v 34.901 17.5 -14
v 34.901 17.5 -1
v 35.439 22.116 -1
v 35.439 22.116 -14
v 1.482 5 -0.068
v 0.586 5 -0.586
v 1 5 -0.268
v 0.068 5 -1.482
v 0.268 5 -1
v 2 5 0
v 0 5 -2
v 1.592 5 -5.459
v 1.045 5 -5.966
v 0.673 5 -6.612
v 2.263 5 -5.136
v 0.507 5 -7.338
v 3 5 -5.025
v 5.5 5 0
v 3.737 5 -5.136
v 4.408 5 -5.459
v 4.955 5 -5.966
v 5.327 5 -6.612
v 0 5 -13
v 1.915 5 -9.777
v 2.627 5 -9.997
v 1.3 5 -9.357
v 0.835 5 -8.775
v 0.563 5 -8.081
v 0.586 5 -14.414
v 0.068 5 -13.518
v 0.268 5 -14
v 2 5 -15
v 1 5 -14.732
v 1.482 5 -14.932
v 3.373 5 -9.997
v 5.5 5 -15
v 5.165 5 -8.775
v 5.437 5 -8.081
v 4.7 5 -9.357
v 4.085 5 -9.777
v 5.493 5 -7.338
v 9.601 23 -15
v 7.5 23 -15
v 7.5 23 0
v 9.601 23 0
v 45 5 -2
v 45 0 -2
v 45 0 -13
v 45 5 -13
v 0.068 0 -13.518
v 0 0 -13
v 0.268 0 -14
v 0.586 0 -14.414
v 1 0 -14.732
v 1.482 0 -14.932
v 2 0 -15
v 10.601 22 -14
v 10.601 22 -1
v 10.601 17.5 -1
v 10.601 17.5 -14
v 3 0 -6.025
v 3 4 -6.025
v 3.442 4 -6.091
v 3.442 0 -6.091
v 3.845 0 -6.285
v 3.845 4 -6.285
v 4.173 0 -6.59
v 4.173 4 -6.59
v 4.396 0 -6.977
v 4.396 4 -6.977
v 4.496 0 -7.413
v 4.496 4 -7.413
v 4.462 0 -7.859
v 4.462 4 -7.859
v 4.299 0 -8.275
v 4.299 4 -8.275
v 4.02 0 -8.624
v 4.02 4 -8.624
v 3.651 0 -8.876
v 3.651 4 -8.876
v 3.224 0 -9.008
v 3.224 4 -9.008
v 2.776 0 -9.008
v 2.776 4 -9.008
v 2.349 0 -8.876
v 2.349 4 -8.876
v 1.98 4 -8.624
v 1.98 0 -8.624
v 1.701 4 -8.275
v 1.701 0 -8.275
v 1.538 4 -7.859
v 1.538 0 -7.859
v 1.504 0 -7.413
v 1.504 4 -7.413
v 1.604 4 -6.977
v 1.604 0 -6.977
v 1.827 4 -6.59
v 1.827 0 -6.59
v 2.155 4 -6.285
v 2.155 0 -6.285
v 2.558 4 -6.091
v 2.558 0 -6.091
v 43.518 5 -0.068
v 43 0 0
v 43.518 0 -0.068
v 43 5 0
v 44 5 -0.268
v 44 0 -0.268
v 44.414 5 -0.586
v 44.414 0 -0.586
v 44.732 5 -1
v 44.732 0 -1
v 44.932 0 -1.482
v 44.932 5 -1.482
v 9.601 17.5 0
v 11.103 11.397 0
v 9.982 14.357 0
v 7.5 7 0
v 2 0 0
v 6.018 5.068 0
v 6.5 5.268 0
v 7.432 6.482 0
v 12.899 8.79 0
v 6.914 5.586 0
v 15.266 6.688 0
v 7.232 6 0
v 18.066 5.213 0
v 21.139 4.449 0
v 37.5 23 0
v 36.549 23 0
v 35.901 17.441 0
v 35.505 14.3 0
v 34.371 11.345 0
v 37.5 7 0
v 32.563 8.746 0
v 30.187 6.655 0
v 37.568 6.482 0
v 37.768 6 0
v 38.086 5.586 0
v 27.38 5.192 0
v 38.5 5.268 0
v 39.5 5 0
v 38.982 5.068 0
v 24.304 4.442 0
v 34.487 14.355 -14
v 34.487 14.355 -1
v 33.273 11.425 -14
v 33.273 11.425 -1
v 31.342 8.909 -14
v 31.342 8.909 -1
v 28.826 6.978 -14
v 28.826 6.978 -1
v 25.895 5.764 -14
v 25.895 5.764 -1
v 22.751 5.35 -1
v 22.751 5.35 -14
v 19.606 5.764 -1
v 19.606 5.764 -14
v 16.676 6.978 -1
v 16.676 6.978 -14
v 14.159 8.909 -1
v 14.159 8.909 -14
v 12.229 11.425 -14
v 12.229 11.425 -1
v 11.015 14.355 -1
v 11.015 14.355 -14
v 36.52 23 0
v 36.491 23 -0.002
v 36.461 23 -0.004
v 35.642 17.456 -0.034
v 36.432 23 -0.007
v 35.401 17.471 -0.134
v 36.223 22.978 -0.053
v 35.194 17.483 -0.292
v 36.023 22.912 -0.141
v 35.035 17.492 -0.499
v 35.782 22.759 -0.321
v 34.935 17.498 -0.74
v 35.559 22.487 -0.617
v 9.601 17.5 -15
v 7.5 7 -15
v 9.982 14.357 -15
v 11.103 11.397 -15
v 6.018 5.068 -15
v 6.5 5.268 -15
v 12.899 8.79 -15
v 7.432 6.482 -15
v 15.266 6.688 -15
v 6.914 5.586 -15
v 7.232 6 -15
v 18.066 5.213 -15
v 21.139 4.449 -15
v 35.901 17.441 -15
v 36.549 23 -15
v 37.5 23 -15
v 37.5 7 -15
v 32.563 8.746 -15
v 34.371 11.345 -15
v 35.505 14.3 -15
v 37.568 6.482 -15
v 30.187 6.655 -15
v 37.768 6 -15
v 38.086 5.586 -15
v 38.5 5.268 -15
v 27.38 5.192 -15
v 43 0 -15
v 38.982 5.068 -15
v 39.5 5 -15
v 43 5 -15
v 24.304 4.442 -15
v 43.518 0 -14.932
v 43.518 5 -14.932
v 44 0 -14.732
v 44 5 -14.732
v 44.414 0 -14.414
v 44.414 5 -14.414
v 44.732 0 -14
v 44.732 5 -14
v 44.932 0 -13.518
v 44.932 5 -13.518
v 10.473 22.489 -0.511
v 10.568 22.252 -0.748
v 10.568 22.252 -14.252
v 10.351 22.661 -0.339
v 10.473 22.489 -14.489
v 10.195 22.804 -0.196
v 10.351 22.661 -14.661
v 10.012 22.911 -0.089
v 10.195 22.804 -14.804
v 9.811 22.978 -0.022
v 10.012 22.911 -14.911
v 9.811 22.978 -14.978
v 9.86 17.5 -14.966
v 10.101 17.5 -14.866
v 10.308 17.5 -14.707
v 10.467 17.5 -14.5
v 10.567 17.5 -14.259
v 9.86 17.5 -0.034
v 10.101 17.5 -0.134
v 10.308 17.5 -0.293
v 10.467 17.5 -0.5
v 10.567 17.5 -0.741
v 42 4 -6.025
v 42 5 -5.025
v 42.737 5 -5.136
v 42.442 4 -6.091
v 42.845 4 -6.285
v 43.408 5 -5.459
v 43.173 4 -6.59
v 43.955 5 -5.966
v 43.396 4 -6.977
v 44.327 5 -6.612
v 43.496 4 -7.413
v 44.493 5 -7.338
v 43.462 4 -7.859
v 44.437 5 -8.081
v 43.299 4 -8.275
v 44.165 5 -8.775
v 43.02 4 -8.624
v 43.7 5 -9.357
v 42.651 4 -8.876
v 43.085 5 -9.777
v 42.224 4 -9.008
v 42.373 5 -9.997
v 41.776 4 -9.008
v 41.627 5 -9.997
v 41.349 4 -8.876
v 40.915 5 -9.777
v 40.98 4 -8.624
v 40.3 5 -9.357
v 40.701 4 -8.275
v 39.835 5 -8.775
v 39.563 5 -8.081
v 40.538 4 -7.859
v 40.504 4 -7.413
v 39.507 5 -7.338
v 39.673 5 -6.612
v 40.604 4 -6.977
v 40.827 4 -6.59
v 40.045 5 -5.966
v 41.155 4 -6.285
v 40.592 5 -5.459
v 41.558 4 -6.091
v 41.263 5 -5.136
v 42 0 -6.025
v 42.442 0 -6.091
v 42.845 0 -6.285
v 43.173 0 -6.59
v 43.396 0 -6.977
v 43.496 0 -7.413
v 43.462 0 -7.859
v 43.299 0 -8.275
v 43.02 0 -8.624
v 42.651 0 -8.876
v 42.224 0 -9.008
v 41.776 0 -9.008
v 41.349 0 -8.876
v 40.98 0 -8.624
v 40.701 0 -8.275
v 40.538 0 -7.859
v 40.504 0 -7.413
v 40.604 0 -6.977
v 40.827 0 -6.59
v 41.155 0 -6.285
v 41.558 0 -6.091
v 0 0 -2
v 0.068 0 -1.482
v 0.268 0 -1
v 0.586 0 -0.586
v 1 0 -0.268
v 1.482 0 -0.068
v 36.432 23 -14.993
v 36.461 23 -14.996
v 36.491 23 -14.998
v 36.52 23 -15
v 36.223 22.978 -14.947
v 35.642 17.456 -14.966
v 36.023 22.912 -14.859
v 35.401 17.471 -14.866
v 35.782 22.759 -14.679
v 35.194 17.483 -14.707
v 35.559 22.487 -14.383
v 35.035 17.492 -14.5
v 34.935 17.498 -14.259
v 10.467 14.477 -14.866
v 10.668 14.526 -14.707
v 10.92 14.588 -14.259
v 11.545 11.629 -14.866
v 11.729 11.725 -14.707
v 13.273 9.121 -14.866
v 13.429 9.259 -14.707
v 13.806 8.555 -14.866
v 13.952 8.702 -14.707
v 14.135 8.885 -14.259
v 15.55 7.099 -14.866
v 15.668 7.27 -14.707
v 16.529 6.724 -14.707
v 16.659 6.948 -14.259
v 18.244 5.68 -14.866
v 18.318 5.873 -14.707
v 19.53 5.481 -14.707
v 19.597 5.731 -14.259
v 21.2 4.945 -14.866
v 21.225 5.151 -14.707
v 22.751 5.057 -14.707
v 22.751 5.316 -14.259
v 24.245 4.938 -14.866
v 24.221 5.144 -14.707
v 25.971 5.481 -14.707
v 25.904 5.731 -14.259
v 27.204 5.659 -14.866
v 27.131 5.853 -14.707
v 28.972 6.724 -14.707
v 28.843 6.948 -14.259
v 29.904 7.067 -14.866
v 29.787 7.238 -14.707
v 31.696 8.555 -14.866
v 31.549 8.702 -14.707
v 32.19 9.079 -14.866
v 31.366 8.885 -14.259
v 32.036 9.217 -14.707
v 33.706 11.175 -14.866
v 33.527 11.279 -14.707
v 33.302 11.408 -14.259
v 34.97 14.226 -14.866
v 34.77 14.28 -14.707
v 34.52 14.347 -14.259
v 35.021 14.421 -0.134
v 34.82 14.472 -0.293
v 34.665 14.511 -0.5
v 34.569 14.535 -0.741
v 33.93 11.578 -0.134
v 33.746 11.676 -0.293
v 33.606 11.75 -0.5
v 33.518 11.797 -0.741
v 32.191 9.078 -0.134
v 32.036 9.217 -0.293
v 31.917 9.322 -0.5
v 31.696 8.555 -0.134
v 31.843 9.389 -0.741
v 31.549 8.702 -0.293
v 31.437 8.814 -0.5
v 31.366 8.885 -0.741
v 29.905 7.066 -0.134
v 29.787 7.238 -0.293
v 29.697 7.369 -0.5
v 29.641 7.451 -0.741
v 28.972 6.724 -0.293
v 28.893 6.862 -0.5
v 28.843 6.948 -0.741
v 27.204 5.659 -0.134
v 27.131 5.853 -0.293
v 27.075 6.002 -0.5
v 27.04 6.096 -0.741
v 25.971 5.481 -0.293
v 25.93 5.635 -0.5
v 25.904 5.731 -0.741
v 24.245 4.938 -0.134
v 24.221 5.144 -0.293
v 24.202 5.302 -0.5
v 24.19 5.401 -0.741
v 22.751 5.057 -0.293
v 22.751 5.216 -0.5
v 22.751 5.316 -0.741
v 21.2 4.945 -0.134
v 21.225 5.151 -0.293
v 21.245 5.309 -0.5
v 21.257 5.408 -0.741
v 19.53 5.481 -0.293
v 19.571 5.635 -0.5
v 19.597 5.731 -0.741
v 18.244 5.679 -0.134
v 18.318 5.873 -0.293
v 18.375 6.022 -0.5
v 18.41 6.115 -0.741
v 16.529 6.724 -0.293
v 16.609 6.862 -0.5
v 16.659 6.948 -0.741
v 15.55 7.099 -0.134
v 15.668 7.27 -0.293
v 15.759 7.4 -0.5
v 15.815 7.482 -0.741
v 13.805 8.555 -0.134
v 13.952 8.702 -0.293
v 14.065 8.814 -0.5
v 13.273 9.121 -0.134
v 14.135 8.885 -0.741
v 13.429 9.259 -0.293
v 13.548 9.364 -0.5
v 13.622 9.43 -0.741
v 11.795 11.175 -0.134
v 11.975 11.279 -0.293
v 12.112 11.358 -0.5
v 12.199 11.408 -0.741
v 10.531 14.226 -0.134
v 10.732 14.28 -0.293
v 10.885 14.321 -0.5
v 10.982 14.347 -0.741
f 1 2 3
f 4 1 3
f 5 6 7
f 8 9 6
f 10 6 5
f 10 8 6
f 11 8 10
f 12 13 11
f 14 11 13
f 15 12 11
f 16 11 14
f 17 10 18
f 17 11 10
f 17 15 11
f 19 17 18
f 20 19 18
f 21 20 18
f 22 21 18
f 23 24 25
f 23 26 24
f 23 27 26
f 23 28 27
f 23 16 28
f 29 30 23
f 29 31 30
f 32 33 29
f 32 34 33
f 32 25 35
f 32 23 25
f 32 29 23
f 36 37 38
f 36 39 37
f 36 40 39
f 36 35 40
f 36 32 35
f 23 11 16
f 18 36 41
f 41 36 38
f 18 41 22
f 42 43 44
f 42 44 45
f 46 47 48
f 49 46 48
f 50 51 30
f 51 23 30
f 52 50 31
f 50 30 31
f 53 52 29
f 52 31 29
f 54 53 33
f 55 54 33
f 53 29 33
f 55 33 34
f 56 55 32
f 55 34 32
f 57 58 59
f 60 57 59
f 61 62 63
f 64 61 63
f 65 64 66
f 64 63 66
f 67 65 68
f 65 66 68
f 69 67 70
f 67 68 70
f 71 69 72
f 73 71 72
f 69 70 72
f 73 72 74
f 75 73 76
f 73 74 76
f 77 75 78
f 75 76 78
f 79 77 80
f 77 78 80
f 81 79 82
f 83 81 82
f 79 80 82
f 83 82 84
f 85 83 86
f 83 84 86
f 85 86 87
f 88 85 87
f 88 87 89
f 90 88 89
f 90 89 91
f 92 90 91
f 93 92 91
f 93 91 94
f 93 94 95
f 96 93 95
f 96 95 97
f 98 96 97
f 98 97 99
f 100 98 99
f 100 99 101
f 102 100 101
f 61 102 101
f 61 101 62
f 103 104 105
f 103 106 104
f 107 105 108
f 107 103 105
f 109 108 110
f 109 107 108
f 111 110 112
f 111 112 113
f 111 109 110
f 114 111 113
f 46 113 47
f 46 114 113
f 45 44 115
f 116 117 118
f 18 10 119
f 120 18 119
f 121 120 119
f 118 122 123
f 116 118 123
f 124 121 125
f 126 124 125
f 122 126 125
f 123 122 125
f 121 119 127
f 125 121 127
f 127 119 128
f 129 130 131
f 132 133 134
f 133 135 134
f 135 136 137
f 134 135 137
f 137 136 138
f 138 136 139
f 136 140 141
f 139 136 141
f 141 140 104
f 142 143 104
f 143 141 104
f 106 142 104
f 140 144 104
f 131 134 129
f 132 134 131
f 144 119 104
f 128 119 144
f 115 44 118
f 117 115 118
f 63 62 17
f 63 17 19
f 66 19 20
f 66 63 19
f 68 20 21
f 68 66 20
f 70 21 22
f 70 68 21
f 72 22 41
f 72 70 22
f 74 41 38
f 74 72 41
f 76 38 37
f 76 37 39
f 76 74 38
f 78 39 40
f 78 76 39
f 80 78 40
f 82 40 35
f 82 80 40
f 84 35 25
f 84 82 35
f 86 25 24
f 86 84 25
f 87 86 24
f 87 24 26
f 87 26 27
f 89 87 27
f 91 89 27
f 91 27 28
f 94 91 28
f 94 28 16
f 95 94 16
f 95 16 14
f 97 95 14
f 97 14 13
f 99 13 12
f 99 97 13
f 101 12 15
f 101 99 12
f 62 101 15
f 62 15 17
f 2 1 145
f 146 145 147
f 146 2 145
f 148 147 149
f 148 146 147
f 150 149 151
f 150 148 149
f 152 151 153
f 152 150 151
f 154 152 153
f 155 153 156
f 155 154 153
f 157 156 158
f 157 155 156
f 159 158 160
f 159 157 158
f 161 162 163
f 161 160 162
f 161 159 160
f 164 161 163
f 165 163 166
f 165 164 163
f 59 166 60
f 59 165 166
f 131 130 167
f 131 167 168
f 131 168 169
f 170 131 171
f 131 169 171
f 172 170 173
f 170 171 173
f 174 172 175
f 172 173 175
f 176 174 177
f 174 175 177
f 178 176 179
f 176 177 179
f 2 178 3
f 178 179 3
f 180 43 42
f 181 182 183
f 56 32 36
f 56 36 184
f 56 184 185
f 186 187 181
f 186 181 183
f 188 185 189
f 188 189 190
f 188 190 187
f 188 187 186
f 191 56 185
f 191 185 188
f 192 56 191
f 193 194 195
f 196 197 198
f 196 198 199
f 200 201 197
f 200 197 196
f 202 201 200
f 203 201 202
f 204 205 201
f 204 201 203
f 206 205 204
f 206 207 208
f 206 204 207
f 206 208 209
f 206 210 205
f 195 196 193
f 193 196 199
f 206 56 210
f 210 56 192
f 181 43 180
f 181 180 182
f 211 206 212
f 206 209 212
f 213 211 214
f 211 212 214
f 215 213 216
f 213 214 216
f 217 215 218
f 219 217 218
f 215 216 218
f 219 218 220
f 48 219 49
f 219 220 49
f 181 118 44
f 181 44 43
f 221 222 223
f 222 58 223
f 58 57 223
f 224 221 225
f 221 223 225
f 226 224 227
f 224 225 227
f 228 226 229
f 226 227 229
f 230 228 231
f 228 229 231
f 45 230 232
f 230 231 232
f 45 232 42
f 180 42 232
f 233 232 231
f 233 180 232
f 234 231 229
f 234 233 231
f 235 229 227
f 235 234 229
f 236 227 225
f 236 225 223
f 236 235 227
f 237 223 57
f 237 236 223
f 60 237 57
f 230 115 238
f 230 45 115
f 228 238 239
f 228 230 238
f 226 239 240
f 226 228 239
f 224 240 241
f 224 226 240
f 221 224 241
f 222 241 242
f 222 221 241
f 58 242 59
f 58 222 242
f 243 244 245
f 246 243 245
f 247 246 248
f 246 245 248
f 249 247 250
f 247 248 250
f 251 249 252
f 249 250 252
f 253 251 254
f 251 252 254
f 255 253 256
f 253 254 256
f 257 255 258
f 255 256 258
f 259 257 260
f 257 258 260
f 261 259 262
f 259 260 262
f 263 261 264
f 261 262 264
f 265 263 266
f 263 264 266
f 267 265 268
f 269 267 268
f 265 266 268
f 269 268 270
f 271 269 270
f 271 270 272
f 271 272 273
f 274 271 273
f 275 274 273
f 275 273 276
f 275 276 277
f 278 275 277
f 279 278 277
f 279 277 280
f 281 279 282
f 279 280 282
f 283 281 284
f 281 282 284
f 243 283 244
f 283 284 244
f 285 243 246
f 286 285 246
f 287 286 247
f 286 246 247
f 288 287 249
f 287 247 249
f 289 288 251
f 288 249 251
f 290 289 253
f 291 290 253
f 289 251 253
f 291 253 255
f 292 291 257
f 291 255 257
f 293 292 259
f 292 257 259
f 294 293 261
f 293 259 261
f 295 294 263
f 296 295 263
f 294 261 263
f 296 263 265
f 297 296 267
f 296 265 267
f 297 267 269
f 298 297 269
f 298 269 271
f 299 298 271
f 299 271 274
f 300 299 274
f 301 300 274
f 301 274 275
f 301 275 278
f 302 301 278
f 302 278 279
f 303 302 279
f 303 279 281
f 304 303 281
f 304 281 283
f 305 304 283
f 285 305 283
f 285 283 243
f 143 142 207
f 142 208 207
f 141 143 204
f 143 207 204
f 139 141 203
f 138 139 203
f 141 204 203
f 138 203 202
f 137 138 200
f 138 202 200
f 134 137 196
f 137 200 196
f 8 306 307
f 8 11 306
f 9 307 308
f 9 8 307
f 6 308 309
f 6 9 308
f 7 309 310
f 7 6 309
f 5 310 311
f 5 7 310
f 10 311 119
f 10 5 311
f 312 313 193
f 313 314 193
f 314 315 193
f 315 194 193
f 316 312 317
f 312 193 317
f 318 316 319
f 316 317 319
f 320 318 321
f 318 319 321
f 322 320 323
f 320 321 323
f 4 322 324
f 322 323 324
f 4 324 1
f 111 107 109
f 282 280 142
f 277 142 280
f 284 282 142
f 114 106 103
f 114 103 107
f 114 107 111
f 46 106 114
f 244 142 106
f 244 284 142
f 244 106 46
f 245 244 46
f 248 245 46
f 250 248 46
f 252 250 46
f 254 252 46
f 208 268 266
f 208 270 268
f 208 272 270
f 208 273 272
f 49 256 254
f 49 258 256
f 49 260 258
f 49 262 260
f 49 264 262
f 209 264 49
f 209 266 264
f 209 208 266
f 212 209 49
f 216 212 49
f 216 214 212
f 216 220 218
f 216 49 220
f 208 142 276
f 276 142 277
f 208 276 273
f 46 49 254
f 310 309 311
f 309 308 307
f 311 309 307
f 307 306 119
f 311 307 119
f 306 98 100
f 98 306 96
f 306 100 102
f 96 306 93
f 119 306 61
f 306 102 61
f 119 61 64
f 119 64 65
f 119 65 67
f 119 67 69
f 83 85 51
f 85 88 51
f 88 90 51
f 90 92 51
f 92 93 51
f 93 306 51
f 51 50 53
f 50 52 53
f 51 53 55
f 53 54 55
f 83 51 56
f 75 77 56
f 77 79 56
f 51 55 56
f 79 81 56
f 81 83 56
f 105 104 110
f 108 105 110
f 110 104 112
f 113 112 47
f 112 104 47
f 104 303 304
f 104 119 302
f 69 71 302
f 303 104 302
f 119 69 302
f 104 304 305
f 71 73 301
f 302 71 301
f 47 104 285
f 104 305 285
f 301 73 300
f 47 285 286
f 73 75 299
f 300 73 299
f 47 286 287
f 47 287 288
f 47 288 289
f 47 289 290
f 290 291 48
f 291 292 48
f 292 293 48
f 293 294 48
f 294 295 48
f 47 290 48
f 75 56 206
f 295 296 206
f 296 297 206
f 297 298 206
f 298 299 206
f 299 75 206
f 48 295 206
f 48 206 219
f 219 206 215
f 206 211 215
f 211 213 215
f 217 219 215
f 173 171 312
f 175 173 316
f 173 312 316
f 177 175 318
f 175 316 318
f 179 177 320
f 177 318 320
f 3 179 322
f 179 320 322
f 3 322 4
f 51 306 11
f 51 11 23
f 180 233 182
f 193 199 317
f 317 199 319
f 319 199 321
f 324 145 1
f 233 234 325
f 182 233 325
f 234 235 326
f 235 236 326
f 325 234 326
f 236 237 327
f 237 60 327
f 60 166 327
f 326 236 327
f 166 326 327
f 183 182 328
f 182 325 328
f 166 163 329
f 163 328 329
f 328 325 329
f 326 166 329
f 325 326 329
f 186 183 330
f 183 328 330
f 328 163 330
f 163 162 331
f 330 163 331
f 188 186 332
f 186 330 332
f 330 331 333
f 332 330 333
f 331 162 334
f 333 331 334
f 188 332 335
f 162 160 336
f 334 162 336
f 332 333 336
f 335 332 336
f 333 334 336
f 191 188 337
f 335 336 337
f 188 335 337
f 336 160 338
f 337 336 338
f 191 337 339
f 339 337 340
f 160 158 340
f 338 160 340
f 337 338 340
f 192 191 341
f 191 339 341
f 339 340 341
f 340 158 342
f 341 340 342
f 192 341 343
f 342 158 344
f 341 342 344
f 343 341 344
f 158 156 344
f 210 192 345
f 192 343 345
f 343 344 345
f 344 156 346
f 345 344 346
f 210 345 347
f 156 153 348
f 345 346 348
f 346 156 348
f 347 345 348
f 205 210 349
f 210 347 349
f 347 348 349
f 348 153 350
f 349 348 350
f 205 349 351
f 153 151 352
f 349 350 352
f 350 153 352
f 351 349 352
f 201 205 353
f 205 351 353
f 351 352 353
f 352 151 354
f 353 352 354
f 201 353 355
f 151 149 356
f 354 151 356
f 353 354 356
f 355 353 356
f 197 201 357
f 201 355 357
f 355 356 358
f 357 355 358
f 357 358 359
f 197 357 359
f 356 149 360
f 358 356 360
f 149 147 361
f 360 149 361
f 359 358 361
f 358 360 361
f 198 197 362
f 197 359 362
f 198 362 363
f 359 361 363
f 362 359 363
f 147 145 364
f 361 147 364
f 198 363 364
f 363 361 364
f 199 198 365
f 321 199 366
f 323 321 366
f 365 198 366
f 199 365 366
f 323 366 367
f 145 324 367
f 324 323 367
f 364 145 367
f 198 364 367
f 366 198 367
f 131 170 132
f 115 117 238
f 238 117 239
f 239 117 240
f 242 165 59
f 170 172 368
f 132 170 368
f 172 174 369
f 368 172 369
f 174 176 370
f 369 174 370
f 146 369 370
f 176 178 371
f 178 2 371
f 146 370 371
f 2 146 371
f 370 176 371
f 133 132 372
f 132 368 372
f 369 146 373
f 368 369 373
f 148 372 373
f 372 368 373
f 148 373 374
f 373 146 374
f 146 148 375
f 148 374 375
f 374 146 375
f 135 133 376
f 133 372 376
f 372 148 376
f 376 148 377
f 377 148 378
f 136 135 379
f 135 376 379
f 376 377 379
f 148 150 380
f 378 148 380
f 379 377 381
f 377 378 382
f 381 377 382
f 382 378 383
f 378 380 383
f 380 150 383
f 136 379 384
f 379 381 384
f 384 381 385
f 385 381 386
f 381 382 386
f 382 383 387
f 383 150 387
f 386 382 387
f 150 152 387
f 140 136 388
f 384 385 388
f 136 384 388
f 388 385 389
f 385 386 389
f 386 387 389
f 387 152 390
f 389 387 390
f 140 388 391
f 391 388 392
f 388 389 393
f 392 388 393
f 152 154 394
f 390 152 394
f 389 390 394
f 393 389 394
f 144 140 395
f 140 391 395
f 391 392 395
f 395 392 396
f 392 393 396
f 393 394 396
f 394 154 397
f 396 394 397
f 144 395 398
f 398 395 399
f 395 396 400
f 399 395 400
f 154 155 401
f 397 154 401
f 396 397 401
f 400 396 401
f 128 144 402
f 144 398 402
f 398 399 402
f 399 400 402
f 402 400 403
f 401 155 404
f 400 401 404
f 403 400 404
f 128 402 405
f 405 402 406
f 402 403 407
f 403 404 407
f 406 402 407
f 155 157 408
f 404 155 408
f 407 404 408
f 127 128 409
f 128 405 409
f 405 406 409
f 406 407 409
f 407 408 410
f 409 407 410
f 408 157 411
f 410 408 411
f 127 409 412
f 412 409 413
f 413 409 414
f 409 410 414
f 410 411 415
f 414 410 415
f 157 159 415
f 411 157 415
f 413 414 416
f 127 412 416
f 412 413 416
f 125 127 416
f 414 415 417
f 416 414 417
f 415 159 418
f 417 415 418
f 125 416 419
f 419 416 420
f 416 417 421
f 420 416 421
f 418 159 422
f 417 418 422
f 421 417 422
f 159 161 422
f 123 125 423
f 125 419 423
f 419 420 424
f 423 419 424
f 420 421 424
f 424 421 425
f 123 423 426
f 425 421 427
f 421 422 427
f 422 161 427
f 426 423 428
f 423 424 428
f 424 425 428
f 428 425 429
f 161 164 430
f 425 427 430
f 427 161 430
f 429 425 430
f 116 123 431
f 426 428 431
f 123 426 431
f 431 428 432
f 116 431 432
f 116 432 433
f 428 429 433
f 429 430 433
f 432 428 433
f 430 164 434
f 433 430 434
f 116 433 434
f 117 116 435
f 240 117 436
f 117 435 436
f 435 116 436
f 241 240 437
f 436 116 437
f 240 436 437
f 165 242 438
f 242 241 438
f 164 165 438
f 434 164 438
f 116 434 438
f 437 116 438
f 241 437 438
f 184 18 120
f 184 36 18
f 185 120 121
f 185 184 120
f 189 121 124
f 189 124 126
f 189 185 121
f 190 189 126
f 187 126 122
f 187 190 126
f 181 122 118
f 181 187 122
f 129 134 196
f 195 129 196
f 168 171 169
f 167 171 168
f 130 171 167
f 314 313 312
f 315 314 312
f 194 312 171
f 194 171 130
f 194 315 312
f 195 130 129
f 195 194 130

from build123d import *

# Parameters (mm, degrees)
SKETCH1_W           = 45
SKETCH1_H           = 15
BOSS_EXTRUDE1_DEPTH = 5
SKETCH2_W           = 30
SKETCH2_H           = 15
BOSS_EXTRUDE2_DEPTH = 18
FILLET1_R           = 2
SKETCH3_R           = 1.5
CUT_EXTRUDE1_DEPTH  = 20
CHAMFER1_SIZE       = 1
CUT_EXTRUDE2_DEPTH  = 20
CUT_EXTRUDE3_DEPTH  = 20
FILLET2_R           = 1


with BuildPart() as part:
    # Sketch1 → Boss-Extrude1 (new body)
    with BuildSketch(Plane(origin=(0, 0, 0), x_dir=(1, 0, 0), z_dir=(0, 1, 0))):
        with Locations((22.5, 7.5)):
            Rectangle(SKETCH1_W, SKETCH1_H)
    extrude(amount=BOSS_EXTRUDE1_DEPTH)

    # Sketch2 → Boss-Extrude2 (add)
    with BuildSketch(Plane(origin=(0, 5, 0), x_dir=(1, 0, 0), z_dir=(0, 1, 0))):
        with Locations((22.5, 7.5)):
            Rectangle(SKETCH2_W, SKETCH2_H)
    extrude(amount=BOSS_EXTRUDE2_DEPTH)

    # Fillet1
    fillet1_edges = [part.edges().sort_by_distance(p)[0] for p in [
        (7.5, 5, -7.5),
        (37.5, 5, -7.5),
        (0, 2.5, 0),
        (0, 2.5, -15),
        (45, 2.5, -15),
        (45, 2.5, 0),
    ]]
    fillet(fillet1_edges, radius=FILLET1_R)

    # Sketch3 → Cut-Extrude1 (cut)
    with BuildSketch(Plane(origin=(0, 5, 0), x_dir=(1, 0, 0), z_dir=(0, 1, 0))):
        with Locations(Location((3, 7.524826623, 0), (0, 0, 270))):
            Circle(SKETCH3_R)
        with Locations(Location((42, 7.524826623, 0), (0, 0, 270))):
            Circle(SKETCH3_R)
    extrude(amount=-CUT_EXTRUDE1_DEPTH, mode=Mode.SUBTRACT)

    # Chamfer1
    chamfer1_edges = [part.edges().sort_by_distance(p)[0] for p in [
        (3, 5, -9.024826623),
        (42, 5, -9.024826623),
    ]]
    chamfer(chamfer1_edges, length=CHAMFER1_SIZE - 0.0001)  # a hair under: the kernel refuses the full size

    # Sketch4 → Cut-Extrude2 (cut)
    with BuildSketch(Plane.XY):
        with BuildLine():
            Line((11.916858064, 23), (33.584575987, 23))
            ThreePointArc((33.584575987, 23), (22.750717026, 5.35), (11.916858064, 23))
        make_face()
    extrude(amount=-CUT_EXTRUDE2_DEPTH, mode=Mode.SUBTRACT)

    # Sketch6 → Cut-Extrude3 (cut)
    with BuildSketch(Plane.XY):
        with BuildLine():
            ThreePointArc((33.584575987, 23), (34.567101549, 20.327641563), (34.900717026, 17.5))
            Line((34.900717026, 17.5), (35.542287994, 23))
            Line((35.542287994, 23), (33.584575987, 23))
        make_face()
        with BuildLine():
            Line((10.600717026, 23), (10.600717026, 17.5))
            ThreePointArc((10.600717026, 17.5), (10.934332503, 20.327641563), (11.916858064, 23))
            Line((11.916858064, 23), (10.600717026, 23))
        make_face()
    extrude(amount=-CUT_EXTRUDE3_DEPTH, mode=Mode.SUBTRACT)

    # Fillet2
    fillet2_edges = [part.edges().sort_by_distance(p)[0] for p in [
        (22.750717026, 5.35, 0),
        (22.750717026, 5.35, -15),
        (35.22150251, 20.25, -15),
        (35.542287994, 23, -7.5),
        (35.22150251, 20.25, 0),
        (10.600717026, 23, -7.5),
        (10.600717026, 20.25, -15),
        (10.600717026, 20.25, 0),
    ]]
    fillet(fillet2_edges, radius=FILLET2_R)


solid = part.part
